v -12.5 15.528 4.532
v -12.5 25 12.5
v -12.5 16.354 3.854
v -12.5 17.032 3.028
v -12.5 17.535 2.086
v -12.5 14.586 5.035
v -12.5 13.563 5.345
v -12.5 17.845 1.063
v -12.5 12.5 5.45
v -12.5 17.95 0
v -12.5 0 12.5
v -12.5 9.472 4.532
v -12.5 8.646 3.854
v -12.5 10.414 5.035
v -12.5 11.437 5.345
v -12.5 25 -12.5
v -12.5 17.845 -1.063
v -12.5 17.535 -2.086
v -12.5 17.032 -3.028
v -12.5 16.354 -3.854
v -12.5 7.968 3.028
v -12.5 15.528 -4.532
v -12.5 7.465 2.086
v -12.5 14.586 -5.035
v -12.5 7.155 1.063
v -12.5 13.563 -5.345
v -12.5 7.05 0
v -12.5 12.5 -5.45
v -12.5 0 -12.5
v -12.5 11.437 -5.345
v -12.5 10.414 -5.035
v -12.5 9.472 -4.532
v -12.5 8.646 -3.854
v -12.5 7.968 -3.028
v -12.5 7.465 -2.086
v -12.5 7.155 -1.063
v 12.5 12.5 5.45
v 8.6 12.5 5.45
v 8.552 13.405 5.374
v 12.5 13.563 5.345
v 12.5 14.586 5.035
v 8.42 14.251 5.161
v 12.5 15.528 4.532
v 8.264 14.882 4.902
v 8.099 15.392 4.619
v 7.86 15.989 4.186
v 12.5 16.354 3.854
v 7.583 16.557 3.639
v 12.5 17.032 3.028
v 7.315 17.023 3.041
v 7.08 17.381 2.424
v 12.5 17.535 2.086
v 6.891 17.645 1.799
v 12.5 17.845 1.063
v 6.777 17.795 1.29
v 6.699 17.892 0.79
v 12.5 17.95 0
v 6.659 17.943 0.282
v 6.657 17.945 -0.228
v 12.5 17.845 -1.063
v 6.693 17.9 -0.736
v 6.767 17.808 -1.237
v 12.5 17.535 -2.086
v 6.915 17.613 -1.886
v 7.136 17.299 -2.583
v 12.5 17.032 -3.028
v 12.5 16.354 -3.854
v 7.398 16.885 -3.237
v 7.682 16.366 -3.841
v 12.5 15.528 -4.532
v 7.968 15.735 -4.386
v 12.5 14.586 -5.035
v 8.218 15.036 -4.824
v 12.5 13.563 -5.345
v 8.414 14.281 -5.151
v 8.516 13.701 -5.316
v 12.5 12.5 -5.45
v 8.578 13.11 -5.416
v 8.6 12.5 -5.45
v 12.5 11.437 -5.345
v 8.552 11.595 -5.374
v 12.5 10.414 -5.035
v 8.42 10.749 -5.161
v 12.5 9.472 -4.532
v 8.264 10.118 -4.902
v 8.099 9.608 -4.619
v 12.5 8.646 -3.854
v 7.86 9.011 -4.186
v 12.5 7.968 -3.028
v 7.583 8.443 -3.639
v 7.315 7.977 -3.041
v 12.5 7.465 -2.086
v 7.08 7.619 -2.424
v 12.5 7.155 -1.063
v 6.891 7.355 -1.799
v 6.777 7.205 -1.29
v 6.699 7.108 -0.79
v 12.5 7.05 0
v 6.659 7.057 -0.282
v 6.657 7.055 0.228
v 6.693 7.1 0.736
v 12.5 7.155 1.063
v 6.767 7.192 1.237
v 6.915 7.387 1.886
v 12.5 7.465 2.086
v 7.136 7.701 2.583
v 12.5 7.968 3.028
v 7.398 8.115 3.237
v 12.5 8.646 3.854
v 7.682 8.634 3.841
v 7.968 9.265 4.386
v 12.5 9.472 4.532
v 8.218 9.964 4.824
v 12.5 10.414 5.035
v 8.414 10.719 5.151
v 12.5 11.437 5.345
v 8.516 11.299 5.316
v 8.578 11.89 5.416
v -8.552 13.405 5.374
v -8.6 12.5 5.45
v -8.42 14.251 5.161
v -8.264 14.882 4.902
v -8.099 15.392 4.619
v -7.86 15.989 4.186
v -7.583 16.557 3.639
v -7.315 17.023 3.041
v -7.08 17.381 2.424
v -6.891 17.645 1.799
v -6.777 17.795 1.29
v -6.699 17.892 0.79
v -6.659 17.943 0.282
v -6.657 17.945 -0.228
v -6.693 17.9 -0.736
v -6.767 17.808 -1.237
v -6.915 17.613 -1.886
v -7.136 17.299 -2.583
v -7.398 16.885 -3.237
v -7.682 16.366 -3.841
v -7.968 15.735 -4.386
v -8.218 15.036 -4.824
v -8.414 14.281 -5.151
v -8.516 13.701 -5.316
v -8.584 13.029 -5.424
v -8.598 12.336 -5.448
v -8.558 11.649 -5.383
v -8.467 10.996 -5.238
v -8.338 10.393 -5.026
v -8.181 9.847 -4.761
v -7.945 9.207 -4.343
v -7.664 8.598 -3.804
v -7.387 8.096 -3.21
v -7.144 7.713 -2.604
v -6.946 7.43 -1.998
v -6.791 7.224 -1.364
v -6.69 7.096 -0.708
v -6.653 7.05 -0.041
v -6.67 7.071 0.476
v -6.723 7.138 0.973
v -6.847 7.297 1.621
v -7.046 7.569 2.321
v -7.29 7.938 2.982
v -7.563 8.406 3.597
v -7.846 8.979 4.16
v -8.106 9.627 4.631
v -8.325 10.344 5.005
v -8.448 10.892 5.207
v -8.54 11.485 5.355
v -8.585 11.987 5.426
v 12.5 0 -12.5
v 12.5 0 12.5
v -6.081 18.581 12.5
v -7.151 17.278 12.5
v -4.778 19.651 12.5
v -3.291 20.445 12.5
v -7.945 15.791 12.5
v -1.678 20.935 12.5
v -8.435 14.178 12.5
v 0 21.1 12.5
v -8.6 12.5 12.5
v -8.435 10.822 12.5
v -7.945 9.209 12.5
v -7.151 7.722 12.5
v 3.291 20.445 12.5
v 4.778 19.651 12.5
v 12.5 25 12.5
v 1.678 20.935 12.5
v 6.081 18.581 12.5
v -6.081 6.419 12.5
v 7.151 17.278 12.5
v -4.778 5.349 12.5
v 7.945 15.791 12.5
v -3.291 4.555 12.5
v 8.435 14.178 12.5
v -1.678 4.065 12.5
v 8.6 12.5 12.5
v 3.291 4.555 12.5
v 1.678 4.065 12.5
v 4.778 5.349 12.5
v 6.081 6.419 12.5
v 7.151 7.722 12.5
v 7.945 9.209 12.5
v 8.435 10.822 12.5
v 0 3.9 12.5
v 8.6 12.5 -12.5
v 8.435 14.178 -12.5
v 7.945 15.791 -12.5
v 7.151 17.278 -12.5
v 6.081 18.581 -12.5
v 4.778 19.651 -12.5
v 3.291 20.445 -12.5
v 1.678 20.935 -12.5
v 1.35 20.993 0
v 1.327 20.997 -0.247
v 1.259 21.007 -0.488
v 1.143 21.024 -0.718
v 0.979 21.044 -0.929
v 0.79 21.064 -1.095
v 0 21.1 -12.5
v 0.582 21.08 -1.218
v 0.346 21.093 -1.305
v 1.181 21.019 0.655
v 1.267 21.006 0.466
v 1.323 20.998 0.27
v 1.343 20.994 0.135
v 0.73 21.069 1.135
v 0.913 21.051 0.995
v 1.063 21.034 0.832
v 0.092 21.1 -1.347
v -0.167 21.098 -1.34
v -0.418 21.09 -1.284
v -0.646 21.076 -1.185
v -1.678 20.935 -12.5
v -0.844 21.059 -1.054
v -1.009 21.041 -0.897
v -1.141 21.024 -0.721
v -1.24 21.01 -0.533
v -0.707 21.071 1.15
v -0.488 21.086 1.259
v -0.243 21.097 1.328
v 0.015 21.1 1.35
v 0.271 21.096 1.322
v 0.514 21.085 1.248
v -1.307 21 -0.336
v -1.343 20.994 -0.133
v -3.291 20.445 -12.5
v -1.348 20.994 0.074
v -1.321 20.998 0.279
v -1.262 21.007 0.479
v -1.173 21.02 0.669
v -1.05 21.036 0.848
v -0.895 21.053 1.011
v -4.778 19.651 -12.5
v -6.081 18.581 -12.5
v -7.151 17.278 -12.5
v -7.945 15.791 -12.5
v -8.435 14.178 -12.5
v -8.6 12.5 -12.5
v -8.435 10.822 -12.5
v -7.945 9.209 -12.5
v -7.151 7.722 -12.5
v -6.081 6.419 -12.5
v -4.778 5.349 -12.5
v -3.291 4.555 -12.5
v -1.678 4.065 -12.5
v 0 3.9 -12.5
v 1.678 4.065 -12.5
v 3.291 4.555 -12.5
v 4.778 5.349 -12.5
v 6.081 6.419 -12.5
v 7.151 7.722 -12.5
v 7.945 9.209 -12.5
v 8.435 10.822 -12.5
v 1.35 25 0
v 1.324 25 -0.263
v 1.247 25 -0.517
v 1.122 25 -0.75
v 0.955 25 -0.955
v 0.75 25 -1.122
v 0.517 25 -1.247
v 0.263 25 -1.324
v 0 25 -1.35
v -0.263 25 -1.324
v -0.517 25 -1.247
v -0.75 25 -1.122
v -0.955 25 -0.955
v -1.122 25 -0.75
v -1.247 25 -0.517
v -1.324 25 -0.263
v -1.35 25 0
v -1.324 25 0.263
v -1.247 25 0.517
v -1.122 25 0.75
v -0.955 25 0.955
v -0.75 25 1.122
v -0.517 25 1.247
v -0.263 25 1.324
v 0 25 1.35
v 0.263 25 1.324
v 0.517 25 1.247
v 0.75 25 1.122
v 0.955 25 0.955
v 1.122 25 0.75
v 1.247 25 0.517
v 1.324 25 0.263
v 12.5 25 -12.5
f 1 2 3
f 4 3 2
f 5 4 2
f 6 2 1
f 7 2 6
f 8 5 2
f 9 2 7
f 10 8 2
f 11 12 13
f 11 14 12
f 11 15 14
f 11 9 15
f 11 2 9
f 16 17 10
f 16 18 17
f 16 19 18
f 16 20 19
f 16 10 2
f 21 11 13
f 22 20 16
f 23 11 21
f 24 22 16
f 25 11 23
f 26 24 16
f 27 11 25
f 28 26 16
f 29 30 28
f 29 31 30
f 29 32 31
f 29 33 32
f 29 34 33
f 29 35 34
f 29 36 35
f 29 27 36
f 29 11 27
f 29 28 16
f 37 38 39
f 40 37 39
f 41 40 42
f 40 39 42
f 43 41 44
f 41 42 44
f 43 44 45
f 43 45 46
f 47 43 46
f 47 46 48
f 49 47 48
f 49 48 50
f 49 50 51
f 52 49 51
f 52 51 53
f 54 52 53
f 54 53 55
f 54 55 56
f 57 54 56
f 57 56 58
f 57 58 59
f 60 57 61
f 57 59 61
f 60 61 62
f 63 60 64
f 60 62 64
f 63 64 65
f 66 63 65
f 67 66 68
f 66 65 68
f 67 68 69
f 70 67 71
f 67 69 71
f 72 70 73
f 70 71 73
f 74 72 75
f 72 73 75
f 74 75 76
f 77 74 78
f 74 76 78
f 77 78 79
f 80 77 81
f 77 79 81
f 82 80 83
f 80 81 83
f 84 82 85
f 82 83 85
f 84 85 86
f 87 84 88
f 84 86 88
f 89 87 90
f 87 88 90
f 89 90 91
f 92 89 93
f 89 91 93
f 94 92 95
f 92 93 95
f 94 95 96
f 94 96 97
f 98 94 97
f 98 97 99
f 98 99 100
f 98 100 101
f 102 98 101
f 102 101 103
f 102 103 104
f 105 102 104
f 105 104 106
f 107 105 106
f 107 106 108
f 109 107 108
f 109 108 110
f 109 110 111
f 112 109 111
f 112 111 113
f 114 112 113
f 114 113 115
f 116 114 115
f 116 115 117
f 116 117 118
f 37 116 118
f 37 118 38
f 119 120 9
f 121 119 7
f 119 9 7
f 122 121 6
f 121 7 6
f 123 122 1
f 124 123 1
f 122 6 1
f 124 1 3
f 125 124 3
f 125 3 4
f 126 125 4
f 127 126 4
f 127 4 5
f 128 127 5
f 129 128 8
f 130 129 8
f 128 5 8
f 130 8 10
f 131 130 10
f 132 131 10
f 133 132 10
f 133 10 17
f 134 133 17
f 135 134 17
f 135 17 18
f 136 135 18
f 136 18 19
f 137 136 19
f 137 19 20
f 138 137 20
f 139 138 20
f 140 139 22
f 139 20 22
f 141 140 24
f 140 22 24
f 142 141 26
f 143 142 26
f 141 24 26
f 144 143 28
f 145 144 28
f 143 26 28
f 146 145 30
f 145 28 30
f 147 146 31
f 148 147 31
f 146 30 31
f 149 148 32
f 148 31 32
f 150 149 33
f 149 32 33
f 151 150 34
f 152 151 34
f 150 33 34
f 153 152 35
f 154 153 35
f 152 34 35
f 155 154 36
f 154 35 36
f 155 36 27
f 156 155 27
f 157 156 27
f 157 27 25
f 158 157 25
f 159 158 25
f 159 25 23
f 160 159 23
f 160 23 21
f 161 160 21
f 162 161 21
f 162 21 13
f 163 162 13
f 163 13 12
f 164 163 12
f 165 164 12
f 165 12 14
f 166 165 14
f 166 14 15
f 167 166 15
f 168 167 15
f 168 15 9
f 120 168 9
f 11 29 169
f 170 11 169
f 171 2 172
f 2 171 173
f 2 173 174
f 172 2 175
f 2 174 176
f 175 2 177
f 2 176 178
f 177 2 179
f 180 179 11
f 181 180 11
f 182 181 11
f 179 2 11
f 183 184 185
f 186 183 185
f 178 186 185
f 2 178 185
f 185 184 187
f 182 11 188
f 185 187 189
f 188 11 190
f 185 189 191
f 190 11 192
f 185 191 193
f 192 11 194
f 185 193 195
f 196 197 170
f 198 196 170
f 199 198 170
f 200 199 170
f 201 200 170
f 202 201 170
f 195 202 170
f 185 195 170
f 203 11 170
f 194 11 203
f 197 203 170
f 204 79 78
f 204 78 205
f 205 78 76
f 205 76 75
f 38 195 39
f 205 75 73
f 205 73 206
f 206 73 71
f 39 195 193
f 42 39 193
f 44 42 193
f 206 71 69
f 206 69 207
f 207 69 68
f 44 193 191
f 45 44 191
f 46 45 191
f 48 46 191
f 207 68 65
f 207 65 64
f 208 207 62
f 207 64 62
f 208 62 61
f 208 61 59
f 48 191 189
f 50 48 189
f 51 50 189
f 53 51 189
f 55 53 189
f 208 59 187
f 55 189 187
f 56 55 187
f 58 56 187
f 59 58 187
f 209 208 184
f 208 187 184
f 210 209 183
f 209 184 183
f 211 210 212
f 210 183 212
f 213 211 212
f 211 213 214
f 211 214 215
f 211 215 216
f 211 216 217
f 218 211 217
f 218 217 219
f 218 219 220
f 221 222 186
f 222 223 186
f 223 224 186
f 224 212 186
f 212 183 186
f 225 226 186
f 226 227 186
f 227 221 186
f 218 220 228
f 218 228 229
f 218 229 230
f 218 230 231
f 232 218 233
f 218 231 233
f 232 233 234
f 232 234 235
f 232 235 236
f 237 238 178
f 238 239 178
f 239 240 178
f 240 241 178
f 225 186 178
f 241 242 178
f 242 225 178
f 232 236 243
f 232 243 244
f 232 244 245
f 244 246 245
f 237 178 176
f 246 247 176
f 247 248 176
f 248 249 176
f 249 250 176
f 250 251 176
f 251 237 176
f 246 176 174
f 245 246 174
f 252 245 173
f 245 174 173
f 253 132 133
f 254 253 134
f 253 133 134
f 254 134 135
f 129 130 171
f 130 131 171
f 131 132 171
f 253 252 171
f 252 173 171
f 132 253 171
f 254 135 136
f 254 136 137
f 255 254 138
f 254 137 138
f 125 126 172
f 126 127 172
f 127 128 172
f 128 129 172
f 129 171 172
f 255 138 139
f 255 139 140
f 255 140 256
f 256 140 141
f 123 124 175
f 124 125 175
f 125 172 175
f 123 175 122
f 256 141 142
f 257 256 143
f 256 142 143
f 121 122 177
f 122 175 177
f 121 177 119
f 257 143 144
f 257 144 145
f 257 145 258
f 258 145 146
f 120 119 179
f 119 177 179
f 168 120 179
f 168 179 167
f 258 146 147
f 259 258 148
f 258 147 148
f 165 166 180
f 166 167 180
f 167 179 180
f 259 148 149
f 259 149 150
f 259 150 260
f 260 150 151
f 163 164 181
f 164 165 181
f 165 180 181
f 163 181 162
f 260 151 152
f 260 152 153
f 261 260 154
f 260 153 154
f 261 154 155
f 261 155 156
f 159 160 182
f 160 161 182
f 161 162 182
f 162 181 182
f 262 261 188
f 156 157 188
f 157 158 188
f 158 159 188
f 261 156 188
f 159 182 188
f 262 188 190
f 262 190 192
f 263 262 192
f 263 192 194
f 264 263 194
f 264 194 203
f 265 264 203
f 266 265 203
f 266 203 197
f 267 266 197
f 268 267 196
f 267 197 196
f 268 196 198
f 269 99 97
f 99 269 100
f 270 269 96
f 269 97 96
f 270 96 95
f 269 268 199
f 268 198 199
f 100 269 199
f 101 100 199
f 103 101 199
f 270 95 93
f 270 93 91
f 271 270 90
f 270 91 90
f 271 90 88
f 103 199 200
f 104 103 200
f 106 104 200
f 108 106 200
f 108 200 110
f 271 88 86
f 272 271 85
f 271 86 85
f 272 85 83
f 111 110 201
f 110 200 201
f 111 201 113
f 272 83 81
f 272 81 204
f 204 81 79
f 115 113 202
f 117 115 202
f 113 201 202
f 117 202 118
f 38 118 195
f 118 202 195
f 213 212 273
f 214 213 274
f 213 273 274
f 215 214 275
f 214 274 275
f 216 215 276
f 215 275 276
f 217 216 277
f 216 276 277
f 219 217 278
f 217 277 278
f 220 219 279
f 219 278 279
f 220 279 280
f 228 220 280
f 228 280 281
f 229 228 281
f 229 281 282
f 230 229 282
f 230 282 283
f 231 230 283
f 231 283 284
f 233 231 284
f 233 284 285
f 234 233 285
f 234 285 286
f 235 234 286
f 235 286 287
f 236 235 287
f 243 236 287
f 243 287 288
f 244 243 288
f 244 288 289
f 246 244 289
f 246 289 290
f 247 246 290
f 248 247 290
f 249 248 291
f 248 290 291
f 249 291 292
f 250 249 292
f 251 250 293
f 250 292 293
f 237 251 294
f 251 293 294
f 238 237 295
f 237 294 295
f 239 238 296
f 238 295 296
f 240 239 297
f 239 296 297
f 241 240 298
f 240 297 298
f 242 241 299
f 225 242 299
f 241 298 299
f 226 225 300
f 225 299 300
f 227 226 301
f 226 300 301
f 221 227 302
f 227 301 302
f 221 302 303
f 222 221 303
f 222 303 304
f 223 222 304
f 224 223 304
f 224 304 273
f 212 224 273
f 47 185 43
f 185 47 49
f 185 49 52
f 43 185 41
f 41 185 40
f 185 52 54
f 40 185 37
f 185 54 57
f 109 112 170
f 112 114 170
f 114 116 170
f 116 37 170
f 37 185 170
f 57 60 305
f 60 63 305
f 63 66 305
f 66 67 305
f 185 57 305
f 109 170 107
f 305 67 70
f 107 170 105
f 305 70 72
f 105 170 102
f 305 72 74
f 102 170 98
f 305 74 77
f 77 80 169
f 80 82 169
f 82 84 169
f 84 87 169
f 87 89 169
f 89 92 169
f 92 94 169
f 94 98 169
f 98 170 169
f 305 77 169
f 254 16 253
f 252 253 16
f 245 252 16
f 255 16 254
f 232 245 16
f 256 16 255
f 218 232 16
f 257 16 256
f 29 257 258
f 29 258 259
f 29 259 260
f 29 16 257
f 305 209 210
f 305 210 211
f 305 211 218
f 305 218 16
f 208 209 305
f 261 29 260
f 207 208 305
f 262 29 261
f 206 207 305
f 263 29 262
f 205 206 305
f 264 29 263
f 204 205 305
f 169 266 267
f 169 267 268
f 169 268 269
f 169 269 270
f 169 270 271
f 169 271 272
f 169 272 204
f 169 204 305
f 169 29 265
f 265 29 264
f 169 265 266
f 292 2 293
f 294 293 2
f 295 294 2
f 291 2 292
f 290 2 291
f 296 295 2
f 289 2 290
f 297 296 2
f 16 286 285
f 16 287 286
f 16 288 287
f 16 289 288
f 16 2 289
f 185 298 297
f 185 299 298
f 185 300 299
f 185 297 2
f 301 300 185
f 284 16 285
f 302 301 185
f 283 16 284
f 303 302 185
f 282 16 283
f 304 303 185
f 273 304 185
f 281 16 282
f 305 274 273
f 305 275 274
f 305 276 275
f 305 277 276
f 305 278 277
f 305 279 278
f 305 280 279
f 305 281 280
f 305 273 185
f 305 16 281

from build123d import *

# Parameters (mm, degrees)
SKETCH3_W           = 25
SKETCH3_H           = 25
BOSS_EXTRUDE1_DEPTH = 25
CUT_EXTRUDE1_REACH  = 27
SKETCH4_R           = 8.6
CUT_EXTRUDE2_REACH  = 27
SKETCH5_R           = 1.35
SKETCH6_R           = 5.45
CUT_EXTRUDE3_DEPTH  = 26


with BuildPart() as part:
    # Sketch3 → Boss-Extrude1 (new body)
    with BuildSketch(Plane(origin=(0, 0, 0), x_dir=(1, 0, 0), z_dir=(0, 1, 0))):
        Rectangle(SKETCH3_W, SKETCH3_H)
    extrude(amount=BOSS_EXTRUDE1_DEPTH)

    # Sketch4 → Cut-Extrude1 (cut, up to next)
    with BuildSketch(Plane.XY.offset(12.5), mode=Mode.PRIVATE) as cut_extrude1_sk1:
        with Locations((0, 12.5)):
            Circle(SKETCH4_R)
    cut_extrude1_tool1 = extrude(cut_extrude1_sk1.sketch, amount=-CUT_EXTRUDE1_REACH, mode=Mode.PRIVATE) & part.part
    add(cut_extrude1_tool1.solids().sort_by_distance((0, 12.5, 12.5))[0], mode=Mode.SUBTRACT)

    # Sketch5 → Cut-Extrude2 (cut, up to next)
    with BuildSketch(Plane(origin=(0, 25, 0), x_dir=(1, 0, 0), z_dir=(0, 1, 0)), mode=Mode.PRIVATE) as cut_extrude2_sk1:
        Circle(SKETCH5_R)
    cut_extrude2_tool1 = extrude(cut_extrude2_sk1.sketch, amount=-CUT_EXTRUDE2_REACH, mode=Mode.PRIVATE) & part.part
    add(cut_extrude2_tool1.solids().sort_by_distance((0, 25, 0))[0], mode=Mode.SUBTRACT)

    # Sketch6 → Cut-Extrude3 (cut, through all)
    with BuildSketch(Plane.ZY.offset(12.5)):
        with Locations((0, 12.5)):
            Circle(SKETCH6_R)
    extrude(amount=-CUT_EXTRUDE3_DEPTH, mode=Mode.SUBTRACT)


solid = part.part
